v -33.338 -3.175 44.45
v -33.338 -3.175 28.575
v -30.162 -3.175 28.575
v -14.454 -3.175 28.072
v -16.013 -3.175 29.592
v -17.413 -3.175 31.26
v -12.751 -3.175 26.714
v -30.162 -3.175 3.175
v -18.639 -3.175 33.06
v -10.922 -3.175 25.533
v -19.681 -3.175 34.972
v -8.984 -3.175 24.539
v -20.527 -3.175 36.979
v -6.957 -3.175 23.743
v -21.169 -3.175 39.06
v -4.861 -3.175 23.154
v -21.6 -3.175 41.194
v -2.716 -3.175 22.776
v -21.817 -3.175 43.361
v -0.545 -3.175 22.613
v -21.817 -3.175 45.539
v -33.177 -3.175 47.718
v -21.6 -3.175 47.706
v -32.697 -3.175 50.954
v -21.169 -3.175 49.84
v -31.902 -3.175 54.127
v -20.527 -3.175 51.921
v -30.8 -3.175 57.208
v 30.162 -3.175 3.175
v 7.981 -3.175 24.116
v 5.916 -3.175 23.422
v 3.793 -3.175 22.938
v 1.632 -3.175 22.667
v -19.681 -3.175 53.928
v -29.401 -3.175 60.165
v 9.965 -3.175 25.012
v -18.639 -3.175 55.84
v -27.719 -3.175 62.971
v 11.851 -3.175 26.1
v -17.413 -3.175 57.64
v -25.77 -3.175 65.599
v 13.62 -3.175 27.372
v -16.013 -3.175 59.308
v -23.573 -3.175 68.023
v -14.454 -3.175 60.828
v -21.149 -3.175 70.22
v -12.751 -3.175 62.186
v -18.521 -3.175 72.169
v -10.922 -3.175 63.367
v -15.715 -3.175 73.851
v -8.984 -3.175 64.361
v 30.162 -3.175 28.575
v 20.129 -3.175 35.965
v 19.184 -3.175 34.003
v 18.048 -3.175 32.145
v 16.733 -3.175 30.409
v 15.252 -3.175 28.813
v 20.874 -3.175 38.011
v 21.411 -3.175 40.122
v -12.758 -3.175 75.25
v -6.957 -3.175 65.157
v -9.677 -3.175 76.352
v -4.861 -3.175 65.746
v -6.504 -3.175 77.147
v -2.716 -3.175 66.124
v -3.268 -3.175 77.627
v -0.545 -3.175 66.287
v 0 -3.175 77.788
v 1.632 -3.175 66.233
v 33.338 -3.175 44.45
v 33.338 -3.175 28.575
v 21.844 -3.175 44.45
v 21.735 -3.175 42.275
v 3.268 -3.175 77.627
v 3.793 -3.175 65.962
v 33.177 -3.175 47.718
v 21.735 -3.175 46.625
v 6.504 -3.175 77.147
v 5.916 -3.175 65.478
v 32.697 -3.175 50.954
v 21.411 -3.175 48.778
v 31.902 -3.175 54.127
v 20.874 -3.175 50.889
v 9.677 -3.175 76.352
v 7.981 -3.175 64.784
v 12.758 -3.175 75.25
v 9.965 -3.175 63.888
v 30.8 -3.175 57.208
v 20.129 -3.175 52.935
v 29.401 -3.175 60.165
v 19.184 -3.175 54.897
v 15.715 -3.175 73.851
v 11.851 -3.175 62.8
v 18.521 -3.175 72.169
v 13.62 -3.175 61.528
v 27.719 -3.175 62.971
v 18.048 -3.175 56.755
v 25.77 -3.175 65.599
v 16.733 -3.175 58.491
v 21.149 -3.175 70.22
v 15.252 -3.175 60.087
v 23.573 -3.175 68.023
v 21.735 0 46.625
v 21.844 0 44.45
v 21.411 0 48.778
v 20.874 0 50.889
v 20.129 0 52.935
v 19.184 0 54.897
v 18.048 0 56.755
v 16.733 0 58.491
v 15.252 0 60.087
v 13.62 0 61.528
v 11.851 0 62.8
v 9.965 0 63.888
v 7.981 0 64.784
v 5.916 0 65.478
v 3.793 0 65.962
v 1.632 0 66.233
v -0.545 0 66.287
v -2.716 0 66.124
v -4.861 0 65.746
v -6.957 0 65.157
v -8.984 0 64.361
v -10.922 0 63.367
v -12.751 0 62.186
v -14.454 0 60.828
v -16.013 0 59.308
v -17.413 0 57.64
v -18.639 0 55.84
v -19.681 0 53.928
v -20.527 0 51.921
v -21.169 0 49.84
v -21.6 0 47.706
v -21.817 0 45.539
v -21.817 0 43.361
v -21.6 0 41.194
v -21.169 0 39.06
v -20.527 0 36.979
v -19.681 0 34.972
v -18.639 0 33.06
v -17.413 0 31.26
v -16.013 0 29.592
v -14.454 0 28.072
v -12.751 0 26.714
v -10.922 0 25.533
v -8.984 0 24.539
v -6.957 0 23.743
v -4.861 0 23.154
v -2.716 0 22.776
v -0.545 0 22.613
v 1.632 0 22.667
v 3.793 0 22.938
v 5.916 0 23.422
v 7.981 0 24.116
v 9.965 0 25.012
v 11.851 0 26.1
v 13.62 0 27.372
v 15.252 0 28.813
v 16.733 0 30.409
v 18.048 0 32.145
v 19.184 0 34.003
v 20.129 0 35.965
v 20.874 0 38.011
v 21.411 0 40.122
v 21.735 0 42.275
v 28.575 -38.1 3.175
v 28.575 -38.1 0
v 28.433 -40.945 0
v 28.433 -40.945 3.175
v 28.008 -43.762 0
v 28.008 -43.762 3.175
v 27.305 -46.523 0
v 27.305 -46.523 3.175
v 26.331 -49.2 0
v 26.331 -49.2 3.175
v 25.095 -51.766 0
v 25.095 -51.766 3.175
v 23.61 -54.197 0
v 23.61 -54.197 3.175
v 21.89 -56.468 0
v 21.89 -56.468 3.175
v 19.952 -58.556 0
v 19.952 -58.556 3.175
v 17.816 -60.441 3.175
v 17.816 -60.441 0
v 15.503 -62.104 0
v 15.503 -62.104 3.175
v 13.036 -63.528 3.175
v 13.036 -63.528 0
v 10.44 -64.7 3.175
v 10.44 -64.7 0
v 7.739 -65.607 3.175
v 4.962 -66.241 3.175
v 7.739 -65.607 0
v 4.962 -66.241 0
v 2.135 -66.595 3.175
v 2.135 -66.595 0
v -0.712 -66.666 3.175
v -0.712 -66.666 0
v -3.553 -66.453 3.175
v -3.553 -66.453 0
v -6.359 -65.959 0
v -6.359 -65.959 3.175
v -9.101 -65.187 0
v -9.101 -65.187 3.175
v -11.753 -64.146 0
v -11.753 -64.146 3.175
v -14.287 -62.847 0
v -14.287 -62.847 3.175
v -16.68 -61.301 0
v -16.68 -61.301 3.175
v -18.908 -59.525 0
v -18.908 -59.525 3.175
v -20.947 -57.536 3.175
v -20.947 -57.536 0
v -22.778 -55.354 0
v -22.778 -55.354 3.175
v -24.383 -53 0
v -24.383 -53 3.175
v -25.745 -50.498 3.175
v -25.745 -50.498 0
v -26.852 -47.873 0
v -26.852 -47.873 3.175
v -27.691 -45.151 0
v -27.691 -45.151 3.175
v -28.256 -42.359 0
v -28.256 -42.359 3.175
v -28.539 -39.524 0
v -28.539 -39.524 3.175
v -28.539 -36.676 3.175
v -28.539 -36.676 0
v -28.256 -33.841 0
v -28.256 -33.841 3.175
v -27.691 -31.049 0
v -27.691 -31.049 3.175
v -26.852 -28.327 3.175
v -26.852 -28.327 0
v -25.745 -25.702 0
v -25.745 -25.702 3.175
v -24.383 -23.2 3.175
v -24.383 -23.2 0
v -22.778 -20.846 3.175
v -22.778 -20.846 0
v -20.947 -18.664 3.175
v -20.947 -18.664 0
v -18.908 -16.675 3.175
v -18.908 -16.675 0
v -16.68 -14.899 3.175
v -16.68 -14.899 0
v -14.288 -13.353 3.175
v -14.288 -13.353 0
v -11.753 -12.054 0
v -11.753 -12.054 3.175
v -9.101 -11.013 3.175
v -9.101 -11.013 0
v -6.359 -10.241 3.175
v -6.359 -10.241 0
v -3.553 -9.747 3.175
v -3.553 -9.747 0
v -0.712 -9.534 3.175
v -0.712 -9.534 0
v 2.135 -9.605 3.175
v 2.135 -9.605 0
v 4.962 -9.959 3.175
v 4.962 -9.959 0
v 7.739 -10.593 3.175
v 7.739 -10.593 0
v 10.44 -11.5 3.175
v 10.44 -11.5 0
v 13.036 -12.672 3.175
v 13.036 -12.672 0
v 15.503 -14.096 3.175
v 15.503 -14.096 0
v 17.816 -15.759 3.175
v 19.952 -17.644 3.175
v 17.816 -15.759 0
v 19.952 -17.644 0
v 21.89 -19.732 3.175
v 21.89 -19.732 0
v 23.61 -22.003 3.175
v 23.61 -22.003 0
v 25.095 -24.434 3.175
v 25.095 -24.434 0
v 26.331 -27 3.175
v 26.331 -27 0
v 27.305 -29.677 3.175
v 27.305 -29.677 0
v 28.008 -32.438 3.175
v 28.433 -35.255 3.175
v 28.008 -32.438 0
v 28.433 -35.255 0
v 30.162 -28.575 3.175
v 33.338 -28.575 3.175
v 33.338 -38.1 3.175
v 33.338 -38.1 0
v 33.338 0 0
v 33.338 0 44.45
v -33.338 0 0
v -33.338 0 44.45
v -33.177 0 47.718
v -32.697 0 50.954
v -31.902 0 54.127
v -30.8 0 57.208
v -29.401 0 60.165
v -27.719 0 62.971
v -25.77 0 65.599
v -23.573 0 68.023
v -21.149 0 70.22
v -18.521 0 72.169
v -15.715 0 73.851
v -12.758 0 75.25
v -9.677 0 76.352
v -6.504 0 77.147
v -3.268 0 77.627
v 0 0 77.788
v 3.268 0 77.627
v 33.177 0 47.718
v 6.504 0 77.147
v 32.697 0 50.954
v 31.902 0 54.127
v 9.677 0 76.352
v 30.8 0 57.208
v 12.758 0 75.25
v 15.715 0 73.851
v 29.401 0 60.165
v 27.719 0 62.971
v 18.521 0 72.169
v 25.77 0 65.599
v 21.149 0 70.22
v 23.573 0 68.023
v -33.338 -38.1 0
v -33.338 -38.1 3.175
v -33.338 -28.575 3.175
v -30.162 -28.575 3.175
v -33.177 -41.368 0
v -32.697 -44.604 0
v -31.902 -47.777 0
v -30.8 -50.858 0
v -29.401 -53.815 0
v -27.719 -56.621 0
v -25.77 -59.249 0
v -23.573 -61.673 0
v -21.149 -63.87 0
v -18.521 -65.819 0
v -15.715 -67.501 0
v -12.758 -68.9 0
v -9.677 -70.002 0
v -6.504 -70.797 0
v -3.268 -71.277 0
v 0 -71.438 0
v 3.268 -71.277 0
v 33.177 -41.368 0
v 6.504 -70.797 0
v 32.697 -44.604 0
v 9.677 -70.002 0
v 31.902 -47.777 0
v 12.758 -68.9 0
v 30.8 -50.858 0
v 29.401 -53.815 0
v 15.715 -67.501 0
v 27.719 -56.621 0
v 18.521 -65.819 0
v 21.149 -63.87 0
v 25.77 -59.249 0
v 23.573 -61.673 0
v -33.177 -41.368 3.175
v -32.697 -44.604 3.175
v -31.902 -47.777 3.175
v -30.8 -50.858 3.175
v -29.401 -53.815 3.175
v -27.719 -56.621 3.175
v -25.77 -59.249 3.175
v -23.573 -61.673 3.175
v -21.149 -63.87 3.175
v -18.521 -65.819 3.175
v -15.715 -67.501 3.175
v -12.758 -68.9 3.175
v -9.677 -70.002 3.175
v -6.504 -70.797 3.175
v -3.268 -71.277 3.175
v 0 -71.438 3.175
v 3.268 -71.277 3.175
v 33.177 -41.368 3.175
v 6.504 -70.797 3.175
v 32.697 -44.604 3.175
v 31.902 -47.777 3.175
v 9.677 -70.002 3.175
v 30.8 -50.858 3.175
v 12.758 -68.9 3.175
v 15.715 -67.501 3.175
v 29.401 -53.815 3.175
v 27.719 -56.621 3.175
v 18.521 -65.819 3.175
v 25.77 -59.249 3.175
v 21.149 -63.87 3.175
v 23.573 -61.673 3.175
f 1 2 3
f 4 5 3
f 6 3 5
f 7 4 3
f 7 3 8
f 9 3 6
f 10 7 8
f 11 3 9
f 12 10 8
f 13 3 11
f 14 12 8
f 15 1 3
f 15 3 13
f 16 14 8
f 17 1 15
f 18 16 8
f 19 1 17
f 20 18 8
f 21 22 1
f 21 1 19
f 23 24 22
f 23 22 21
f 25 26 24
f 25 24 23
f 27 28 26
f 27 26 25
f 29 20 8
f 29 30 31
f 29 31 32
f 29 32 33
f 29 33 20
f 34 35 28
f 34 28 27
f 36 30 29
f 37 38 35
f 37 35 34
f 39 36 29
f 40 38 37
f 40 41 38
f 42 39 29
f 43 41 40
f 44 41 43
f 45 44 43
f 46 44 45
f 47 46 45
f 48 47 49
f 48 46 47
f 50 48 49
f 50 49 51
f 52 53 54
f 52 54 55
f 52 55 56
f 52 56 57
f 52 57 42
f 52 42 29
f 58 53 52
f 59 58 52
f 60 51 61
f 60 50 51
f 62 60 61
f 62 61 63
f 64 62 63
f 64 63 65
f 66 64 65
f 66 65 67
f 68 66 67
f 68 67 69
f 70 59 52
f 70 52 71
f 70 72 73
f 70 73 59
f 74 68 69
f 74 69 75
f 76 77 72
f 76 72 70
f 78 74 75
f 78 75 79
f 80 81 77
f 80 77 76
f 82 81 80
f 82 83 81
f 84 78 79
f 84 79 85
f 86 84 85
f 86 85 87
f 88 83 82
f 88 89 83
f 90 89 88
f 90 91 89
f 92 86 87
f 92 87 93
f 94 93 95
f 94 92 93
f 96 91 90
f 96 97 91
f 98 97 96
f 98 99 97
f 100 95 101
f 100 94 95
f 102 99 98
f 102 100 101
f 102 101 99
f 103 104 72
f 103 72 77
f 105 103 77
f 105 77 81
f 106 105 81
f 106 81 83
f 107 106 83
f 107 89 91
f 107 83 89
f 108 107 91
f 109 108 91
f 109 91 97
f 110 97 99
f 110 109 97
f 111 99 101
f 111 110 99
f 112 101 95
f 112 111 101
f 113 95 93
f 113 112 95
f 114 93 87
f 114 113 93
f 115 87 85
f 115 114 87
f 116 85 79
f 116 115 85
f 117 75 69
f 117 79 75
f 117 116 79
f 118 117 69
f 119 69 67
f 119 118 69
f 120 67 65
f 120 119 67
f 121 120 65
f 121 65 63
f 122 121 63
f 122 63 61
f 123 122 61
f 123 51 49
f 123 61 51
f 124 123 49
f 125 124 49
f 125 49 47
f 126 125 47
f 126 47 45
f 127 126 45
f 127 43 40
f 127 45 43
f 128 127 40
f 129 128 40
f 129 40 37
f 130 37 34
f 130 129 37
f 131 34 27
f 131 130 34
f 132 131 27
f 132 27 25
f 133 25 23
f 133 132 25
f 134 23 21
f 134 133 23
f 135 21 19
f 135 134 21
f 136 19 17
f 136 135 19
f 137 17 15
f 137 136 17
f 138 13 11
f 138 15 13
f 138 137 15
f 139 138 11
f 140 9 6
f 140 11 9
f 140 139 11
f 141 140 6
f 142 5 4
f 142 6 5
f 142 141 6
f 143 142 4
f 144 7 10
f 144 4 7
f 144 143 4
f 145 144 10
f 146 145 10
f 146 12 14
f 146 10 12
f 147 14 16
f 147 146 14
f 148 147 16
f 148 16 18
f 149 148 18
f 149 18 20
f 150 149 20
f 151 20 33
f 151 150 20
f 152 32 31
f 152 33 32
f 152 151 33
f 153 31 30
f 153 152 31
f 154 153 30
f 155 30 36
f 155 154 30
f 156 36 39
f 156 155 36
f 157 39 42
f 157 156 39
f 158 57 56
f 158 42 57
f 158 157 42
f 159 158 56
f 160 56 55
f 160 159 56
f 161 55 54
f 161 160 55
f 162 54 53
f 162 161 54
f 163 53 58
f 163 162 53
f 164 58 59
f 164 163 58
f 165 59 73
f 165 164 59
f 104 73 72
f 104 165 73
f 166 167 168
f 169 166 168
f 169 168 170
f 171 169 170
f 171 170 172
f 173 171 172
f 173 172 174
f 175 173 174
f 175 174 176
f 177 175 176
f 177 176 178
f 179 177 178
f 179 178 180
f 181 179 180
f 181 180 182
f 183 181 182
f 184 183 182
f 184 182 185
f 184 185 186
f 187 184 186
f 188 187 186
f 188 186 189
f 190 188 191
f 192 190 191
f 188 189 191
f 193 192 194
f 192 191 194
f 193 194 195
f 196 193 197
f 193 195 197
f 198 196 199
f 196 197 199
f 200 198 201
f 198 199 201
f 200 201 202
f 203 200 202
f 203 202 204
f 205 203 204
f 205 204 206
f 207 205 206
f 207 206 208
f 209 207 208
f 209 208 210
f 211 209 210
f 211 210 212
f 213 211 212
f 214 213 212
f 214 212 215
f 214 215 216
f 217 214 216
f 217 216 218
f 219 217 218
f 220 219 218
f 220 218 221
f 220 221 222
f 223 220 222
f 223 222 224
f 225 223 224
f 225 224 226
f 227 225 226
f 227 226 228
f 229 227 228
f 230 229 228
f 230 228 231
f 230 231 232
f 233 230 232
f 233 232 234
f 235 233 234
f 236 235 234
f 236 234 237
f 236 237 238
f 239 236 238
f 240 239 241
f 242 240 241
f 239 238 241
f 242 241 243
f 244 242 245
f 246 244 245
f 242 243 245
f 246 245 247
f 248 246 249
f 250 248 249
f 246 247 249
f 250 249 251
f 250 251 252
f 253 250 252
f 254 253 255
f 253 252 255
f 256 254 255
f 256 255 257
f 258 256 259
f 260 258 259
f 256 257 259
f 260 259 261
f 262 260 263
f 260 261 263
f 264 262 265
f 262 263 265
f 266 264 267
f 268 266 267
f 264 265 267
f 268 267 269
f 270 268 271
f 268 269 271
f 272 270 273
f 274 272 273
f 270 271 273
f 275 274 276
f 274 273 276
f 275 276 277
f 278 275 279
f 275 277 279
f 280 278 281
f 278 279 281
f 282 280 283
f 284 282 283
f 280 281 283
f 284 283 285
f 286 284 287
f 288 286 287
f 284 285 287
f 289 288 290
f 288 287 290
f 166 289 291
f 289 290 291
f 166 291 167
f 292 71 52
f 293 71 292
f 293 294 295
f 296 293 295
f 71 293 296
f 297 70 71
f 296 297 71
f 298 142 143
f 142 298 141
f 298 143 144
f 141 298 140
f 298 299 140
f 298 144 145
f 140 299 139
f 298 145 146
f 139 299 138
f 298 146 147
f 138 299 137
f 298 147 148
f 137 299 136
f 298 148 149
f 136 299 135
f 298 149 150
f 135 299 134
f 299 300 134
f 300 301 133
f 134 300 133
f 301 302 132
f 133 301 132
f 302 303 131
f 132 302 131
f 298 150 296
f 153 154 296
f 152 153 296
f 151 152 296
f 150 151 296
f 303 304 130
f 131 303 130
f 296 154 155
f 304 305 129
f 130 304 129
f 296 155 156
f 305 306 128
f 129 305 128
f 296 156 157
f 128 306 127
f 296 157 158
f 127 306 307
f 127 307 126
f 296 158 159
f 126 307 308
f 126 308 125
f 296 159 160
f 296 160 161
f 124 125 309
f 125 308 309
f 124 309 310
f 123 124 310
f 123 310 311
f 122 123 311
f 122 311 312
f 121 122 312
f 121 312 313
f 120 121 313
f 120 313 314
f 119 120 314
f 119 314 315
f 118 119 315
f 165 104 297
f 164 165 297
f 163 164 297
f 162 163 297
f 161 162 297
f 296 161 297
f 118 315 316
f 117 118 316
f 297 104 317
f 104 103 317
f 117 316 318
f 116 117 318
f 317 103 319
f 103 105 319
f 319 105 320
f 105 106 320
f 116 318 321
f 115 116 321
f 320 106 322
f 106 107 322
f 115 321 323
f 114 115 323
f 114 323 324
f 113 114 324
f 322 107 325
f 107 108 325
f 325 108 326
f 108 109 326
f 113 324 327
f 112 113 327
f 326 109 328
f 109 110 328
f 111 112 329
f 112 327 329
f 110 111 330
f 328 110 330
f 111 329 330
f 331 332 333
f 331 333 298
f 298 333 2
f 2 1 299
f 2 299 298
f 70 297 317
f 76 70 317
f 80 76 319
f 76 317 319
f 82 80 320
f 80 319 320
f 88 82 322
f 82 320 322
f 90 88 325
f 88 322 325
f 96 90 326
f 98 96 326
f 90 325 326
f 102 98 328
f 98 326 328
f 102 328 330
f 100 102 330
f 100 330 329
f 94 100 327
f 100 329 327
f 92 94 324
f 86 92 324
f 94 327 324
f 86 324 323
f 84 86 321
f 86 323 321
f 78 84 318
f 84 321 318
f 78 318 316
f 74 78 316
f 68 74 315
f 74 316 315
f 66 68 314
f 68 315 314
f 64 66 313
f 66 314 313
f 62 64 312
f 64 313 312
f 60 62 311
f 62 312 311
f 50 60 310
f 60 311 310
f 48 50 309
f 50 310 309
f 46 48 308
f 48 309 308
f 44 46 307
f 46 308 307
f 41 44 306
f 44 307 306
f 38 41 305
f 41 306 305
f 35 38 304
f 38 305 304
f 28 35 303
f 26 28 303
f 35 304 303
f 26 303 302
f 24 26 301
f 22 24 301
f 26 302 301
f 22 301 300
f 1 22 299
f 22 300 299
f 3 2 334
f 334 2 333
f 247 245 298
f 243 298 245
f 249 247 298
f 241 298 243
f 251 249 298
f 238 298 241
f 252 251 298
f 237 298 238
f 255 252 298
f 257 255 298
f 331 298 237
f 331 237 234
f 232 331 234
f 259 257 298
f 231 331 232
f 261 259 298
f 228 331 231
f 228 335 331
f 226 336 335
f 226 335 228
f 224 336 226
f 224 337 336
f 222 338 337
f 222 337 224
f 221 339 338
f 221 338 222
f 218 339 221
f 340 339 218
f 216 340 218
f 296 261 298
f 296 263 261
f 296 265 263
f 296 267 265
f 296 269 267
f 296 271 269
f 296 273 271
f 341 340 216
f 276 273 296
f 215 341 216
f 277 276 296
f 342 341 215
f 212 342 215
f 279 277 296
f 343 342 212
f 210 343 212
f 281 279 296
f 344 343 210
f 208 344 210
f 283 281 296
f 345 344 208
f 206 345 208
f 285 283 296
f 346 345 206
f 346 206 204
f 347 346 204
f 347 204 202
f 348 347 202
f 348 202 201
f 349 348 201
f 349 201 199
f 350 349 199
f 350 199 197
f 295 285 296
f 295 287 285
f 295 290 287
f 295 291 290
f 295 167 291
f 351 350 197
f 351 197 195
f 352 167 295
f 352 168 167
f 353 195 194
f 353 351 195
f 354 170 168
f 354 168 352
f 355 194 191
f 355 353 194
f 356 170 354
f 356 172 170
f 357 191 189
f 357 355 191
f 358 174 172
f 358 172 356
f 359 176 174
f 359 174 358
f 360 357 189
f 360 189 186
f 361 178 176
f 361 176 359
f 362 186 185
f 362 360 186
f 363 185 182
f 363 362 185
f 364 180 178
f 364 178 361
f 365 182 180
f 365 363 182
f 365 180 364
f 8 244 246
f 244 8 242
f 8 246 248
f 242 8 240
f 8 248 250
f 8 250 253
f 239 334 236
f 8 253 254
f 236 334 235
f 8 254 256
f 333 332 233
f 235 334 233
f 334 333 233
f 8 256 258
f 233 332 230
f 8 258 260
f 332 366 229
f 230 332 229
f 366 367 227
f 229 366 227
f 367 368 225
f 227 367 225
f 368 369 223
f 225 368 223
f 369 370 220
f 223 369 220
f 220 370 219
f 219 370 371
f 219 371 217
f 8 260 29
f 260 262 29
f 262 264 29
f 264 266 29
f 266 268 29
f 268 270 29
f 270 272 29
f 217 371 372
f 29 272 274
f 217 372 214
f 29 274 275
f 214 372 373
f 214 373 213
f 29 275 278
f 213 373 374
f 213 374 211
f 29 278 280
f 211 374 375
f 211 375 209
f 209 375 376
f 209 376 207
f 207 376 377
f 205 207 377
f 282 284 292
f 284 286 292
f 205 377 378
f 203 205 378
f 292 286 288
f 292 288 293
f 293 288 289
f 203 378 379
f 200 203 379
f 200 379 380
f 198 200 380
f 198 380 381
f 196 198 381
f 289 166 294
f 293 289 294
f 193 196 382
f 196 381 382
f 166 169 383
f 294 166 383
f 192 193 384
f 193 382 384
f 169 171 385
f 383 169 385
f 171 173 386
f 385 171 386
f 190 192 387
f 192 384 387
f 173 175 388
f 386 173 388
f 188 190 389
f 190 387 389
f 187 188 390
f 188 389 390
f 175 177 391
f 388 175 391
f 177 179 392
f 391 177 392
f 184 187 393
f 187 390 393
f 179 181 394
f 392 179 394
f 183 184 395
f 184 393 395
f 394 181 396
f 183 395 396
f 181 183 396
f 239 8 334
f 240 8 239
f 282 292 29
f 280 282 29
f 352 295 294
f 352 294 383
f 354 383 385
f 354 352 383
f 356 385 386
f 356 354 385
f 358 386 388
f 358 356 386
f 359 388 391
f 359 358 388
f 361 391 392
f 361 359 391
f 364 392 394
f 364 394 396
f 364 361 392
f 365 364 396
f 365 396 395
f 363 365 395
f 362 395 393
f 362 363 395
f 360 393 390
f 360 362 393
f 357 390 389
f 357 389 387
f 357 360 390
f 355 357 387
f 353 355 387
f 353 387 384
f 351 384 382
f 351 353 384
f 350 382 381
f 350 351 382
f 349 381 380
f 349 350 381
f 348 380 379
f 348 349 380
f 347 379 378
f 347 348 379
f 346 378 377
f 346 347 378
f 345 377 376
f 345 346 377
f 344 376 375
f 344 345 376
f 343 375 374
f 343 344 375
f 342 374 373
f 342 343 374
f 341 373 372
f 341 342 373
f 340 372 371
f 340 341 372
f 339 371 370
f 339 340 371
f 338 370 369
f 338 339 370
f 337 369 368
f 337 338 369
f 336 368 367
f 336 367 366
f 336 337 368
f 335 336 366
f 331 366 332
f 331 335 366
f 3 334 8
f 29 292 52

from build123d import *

# Parameters (mm, degrees)
F1_R     = 21.844
F2_DEPTH = 3.175
F3_R     = 28.575
F4_DEPTH = 3.175
F6_DEPTH = 3.175


# Not quite as in the source:
# - a variable given as a bare number and used for a length is read in inches; the dataset says mm whatever the document's units were


with BuildPart() as f2:
    # F1 (on Front) → F2 (new body)
    with BuildSketch(Plane.XZ):
        with BuildLine():
            Line((33.3375, 0), (33.3375, 44.45))
            ThreePointArc((33.3375, 44.45), (0, 77.7875), (-33.3375, 44.45))
            Line((-33.3375, 44.45), (-33.3375, 0))
            Line((-33.3375, 0), (33.3375, 0))
        make_face()
        with Locations((0, 44.45)):
            Circle(F1_R, mode=Mode.SUBTRACT)
    extrude(amount=F2_DEPTH)

    # F3 (on face) → F4 (join)
    with BuildSketch(Plane(origin=(0, 0, 0), x_dir=(1, 0, 0), z_dir=(0, 0, -1))):
        with BuildLine():
            Line((-33.3375, 38.1), (-33.3375, 3.175))
            Line((-33.3375, 3.175), (33.3375, 3.175))
            Line((33.3375, 3.175), (33.3375, 38.1))
            ThreePointArc((33.3375, 38.1), (0, 71.4375), (-33.3375, 38.1))
        make_face()
        with Locations((0, 38.1)):
            Circle(F3_R, mode=Mode.SUBTRACT)
    extrude(amount=-F4_DEPTH)

    # F5 (on face) → F6 (join)
    with BuildSketch(Plane.YZ.offset(33.3375)):
        Polygon((-3.175, 3.175), (-3.175, 28.575), (-28.575, 3.175), align=None)
    extrude(amount=-F6_DEPTH)

    # F7: F2 across plane


with BuildPart() as f2_1:
    add(f2.part)
    add(f2.part.mirror(Plane.YZ))


solid = f2_1.part
